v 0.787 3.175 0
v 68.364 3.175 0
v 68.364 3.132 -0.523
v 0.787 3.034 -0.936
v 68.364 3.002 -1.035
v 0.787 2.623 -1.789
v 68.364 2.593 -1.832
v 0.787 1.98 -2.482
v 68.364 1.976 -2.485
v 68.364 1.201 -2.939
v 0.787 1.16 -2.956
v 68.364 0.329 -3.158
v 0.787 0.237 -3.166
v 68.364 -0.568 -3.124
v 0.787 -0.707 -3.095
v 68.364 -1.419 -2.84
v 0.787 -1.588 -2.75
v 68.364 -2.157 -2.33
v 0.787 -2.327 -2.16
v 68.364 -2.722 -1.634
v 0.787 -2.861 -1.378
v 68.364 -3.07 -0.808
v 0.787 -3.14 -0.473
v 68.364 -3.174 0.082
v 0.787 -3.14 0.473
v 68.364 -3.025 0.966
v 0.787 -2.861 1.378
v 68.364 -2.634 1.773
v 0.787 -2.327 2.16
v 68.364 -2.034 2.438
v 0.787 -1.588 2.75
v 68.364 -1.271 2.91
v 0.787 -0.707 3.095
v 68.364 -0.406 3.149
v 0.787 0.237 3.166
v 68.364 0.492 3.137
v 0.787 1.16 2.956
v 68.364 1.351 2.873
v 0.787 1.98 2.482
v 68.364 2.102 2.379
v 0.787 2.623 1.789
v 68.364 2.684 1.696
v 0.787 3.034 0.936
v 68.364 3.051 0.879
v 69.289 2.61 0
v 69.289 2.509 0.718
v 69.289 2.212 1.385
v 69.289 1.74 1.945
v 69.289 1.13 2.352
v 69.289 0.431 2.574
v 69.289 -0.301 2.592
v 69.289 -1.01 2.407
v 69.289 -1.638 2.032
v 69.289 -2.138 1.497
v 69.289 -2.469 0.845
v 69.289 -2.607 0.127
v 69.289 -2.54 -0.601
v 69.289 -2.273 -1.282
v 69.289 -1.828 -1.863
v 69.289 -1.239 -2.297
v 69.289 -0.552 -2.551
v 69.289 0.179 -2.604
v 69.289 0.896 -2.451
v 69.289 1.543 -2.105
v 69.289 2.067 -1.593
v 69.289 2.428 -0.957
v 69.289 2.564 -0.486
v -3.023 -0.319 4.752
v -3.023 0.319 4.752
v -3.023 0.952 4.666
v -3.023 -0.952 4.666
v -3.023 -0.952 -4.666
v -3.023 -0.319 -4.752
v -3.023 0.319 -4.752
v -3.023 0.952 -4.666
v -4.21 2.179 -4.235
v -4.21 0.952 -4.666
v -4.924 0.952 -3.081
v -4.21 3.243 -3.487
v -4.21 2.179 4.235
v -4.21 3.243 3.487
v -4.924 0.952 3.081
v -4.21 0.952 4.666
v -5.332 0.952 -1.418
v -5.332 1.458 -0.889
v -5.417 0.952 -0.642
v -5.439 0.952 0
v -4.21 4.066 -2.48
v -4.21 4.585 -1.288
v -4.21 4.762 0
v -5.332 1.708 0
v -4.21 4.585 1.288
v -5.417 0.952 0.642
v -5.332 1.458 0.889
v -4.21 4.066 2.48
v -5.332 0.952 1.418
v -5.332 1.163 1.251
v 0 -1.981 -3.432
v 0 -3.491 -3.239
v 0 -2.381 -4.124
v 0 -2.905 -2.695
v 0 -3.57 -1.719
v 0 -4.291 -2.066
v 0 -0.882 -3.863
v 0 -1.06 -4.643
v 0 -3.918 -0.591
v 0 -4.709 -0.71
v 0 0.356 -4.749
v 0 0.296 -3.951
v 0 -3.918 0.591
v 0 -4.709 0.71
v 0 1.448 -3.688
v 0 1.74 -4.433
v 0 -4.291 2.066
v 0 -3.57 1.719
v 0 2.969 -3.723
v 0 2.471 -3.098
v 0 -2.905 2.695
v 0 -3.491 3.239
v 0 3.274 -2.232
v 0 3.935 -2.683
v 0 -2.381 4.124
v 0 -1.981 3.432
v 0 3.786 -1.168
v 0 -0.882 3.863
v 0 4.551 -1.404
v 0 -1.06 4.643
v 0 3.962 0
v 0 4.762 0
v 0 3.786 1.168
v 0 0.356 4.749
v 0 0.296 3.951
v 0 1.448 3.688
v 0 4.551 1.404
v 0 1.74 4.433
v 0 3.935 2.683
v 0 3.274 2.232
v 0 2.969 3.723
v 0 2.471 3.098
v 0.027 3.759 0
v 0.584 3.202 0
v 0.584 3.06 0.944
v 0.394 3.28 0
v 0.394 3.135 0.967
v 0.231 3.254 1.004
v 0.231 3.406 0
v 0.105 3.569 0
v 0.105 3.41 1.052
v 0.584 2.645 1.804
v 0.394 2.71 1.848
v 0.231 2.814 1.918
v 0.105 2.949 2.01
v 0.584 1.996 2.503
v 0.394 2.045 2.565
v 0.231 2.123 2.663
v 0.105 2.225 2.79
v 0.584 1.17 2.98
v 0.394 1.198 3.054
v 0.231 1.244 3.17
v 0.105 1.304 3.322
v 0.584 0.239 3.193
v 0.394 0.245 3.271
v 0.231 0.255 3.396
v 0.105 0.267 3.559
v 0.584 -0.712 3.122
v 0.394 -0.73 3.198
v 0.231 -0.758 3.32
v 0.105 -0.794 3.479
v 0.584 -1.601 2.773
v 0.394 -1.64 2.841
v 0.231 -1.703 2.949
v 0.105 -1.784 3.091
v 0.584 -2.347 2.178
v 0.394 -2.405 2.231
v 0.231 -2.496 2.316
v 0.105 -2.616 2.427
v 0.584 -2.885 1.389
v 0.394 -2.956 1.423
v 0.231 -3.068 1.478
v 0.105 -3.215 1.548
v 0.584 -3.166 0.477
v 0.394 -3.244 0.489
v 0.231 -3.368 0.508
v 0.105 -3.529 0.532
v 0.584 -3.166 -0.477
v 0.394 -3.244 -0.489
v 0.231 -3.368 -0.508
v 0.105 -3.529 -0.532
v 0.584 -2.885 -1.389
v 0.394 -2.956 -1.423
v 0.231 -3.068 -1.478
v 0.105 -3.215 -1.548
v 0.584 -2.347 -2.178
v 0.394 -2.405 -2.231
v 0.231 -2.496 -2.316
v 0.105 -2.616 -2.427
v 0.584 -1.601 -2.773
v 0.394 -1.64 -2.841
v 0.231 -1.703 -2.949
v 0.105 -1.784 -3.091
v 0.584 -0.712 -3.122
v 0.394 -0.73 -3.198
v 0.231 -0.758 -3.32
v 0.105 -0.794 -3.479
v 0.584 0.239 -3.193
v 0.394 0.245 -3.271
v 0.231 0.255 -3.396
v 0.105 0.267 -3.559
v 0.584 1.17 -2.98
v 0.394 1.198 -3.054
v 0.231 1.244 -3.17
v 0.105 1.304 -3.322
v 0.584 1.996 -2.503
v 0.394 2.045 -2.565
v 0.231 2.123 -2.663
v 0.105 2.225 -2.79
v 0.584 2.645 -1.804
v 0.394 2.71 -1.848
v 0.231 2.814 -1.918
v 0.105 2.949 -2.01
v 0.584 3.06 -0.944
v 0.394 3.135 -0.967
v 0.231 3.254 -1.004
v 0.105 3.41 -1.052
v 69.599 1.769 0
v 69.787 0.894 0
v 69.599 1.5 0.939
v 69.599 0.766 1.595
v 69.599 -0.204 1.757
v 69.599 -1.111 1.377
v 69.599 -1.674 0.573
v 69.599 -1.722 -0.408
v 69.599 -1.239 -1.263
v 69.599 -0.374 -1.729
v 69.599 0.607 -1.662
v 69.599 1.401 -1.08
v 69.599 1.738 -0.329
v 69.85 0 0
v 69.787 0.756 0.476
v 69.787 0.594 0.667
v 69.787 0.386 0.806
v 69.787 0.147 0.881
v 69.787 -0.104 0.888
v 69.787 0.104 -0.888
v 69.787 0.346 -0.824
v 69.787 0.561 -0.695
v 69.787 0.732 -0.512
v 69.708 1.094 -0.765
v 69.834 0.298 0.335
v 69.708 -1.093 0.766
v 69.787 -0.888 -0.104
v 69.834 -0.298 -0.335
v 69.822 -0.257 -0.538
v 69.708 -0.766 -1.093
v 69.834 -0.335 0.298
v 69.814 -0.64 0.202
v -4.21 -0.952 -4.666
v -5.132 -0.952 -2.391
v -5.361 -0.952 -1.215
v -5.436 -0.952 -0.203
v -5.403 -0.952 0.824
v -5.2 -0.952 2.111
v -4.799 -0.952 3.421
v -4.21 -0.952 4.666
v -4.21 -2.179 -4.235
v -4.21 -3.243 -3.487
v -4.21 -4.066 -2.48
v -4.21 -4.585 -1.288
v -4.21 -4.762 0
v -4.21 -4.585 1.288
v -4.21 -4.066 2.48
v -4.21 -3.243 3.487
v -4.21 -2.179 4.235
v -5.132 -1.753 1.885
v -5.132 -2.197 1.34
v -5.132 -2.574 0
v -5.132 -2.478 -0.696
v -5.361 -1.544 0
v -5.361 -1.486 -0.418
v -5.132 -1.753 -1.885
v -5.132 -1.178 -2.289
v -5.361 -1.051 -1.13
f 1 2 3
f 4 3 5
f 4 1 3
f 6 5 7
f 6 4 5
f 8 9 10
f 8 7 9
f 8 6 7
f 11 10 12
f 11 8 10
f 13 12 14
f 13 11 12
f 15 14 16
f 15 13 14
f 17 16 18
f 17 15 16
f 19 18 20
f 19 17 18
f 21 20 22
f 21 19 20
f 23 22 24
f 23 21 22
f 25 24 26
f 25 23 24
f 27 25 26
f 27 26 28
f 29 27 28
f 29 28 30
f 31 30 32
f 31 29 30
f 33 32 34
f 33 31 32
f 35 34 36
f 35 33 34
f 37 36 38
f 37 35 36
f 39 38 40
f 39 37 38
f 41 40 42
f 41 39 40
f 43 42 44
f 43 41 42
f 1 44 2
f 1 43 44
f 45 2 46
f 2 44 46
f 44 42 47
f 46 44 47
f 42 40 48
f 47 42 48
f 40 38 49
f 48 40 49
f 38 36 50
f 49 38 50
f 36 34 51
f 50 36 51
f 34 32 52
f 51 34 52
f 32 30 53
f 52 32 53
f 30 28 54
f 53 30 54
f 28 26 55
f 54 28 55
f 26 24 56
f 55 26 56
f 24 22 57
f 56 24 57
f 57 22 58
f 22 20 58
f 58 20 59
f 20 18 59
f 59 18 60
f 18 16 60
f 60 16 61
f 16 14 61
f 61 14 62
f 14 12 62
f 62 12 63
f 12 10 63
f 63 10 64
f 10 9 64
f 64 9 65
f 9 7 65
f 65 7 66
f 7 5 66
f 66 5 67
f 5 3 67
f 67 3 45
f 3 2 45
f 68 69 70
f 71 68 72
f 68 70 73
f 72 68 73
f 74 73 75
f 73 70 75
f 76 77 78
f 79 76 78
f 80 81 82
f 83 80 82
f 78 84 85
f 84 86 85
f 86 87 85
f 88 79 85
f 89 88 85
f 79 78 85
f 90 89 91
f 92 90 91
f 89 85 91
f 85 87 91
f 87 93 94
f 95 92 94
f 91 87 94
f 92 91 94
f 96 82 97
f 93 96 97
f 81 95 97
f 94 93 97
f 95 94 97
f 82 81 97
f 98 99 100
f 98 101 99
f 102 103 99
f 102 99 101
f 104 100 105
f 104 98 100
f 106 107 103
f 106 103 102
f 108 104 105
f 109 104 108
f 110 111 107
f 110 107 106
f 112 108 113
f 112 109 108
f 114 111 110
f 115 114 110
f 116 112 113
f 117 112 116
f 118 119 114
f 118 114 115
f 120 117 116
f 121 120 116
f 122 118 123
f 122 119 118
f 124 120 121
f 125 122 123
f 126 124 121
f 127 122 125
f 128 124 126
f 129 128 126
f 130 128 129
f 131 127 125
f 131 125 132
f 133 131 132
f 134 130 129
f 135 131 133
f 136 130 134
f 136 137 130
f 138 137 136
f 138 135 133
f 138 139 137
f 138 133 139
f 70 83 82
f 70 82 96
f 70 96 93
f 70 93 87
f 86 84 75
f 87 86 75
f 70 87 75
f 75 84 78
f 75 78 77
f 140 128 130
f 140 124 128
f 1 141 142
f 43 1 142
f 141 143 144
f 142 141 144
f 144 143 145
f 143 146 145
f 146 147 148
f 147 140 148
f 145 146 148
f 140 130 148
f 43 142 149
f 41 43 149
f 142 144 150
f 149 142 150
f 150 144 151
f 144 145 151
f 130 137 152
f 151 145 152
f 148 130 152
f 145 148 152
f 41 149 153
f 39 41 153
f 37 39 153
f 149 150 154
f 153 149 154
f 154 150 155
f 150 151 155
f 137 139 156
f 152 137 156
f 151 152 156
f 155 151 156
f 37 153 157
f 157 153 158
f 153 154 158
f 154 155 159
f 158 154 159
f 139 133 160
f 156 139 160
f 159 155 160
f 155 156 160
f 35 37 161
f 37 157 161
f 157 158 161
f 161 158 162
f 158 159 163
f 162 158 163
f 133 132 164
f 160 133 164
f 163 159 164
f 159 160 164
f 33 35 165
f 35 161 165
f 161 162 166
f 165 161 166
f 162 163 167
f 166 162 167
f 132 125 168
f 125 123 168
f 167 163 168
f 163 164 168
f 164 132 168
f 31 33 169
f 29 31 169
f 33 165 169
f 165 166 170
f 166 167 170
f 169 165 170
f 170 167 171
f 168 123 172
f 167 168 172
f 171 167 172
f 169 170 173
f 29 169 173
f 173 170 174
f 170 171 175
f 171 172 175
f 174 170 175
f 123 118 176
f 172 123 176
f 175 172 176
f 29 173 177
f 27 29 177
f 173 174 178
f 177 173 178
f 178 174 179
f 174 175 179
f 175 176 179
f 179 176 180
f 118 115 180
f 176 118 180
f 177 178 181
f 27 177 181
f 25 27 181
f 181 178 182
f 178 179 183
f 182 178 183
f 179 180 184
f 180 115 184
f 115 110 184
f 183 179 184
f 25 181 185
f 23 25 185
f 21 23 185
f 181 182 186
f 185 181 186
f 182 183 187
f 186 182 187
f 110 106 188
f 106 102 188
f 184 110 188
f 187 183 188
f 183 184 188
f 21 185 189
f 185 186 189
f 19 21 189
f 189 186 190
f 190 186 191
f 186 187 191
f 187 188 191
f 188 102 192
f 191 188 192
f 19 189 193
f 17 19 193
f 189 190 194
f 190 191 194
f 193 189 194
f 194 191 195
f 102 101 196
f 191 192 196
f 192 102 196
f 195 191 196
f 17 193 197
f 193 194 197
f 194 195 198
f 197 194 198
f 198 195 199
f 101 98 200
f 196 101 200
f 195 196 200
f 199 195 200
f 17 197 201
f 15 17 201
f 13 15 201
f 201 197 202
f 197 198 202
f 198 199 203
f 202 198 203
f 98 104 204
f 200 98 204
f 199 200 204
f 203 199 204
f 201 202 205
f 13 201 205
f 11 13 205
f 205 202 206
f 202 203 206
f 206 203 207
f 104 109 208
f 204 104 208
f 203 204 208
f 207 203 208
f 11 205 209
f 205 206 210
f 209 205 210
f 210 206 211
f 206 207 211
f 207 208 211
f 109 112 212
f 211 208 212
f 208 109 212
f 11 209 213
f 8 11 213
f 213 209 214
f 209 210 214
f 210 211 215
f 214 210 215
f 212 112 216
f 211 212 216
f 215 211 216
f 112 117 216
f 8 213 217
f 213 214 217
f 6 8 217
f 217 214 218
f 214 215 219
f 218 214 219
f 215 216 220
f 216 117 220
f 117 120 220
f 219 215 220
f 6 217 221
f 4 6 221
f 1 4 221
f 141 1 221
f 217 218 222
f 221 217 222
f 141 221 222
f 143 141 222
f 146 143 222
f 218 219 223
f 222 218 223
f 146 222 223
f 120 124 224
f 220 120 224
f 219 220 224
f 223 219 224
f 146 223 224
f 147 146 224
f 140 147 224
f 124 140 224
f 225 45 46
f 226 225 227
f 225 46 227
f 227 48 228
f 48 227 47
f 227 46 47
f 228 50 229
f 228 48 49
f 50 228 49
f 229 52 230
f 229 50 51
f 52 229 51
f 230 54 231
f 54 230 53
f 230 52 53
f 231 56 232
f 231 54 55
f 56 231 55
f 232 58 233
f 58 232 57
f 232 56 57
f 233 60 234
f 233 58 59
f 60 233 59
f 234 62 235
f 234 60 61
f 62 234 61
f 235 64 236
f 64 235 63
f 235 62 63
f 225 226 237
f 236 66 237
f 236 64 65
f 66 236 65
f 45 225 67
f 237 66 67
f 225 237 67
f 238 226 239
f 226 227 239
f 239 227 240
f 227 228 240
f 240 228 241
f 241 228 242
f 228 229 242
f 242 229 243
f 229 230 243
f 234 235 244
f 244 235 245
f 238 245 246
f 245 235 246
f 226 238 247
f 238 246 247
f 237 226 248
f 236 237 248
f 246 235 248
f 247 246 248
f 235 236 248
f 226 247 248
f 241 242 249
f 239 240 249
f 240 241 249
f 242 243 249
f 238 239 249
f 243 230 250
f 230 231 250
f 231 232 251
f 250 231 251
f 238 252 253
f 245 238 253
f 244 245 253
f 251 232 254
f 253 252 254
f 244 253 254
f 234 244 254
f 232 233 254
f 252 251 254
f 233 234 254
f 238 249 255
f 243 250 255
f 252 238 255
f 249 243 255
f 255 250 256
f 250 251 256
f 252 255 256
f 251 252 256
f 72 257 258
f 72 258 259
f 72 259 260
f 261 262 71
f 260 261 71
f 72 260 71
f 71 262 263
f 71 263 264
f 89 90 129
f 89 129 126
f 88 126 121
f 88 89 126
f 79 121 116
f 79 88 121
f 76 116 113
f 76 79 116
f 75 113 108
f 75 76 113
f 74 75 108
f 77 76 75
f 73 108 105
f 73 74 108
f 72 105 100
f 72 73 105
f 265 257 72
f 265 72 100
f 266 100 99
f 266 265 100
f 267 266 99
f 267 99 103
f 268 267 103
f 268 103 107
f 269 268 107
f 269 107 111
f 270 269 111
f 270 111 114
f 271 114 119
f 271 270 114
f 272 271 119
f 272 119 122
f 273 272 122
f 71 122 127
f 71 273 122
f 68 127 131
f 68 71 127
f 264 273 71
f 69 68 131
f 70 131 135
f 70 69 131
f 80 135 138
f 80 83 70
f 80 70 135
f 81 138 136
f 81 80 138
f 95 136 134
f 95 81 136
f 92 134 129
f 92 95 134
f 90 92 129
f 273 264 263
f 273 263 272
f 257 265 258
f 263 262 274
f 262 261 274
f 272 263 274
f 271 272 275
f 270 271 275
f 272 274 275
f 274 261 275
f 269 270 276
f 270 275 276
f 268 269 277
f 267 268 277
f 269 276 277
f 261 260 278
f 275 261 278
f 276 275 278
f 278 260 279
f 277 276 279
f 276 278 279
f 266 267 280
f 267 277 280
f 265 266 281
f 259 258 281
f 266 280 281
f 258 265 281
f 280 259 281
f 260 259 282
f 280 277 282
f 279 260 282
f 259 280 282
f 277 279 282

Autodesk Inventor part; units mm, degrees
ref_plane "YZ Plane" through (0, 0, 0) normal (1, 0, 0) x (0, 1, 0)
sketch "Sketch1" plane through (0, 0, 0) normal (0, 0, 1) x (1, 0, 0)
  line L0 (-5.4864, 0) -> (69.85, 0)
  line L1 (69.85, 0) -> (69.85, 3.175)
  line L2 (69.85, 3.175) -> (50.8, 3.175)
  line L3 (50.8, 3.175) -> (50.038, 3.175)
  line L4 (50.038, 3.175) -> (0, 3.175)
  line L5 (0, 3.175) -> (0, 4.7625)
  line L6 (-20.9299, 0) -> (84.98, 0) projected
  line L7 (0, -0.9693) -> (0, 5.8158) projected
  line L8 (0, 4.7625) -> (-4.2103, 4.7625)
  arc A0 (-4.2103, 4.7625) -> (-5.4864, 0) centre (4.0386, 0) ccw
  line L9 (50.8, 3.175) -> (0, 3.175) construction
  dimension "d0" = 69.85
  dimension "d1" = 19.05
  dimension "d2" = 0.762
  dimension "d3" = 5.4864
  dimension "d4" = 6.35
  dimension "d5" = 6.35
  dimension "d9" = 9.525
  dimension "d10" = 0
  dimension "d13" = 9.525
revolve "Body" add sketch "Sketch1" angle 360 about axis through (-5.4864, 0, 0) along (1, 0, 0)
ref_plane "IDS_WORKPLANE{1}" through (-5.4864, 0, 0) normal (1, 0, 0) x (0, 0, -1)
sketch "Sketch2" plane through (-5.4864, 0, 0) normal (1, 0, 0) x (0, 0, -1)
  circle A0 centre (0, 0) radius 4.7625 projected
  line L0 (0, -6.6675) -> (0, 6.6675) projected
  line L1 (6.6675, 0) -> (-6.6675, 0) projected
  line L2 (-4.7625, 0.9525) -> (4.7625, 0.9525)
  line L3 (4.7625, 0.9525) -> (4.7625, -0.9525)
  line L4 (4.7625, -0.9525) -> (-4.7625, -0.9525)
  line L5 (-4.7625, -0.9525) -> (-4.7625, 0.9525)
  line L6 (-4.7625, 0) -> (4.7625, 0) construction
  line L7 (0, 0.9525) -> (0, -0.9525) construction
  dimension "d15" = 1.905
extrude "Slot" cut sketch "Sketch2" along normal blind 2.4638 contours L1 L0 L2 A0 | L3 L4 A0 | A0 L4 L0 L1 | A0 L2 L3 | L1 A0 L2 L0 | L0 L4 A0 L1 | L5 L2 A0 | A0 L4 L5
thread "Thread" size "1/4-20 UNC" class "2A" standard "ANSI Unified Screw Threads" length 19.05
sketch "Sketch3" plane through (0, 0, 0) normal (0, 0, 1) x (1, 0, 0)
  line L0 (69.85, 0) -> (69.85, 3.175) projected
  line L1 (69.85, 3.175) -> (50.8, 3.175) projected
  line L2 (-5.4864, 0) -> (69.85, 0) projected
  arc A0 (69.85, 0) -> (68.9993, 3.175) centre (63.5, 0) ccw
  line L3 (69.85, -3.175) -> (69.85, 3.175) projected
  line L4 (68.9993, 3.175) -> (68.9993, 0)
  line L5 (68.9993, 0) -> (69.85, 0)
  dimension "d40" = 6.35
revolve "Fillet1" cut sketch "Sketch3" angle 360 about axis through (-5.4864, 0, 0) along (1, 0, 0) contours A0 L1 L0
chamfer "Chamfer" distance 0.635 angle 45 1 edges at (68.9993, -3.175, 0)
ref_plane "Work Plane2" through (41.275, 0, 0) normal (0, 0, -1) x (1, 0, 0)
fillet "Fillet4" radius 0.7874 1 edges at (0, -3.175, 0)
equation "\"d0\" = NLG"
equation "\"d1\" = GEL"
equation "\"d2\" = GAL"
equation "\"d3\" = KOH"
equation "\"d4\" = GD"
equation "\"d5\" = BDM"
equation "\"d9\" = KOD"
equation "\"d13\" = KR"
equation "\"d15\" = SBR"
equation "\"d16\" = STI"
equation "\"d40\" = GD"
equation "\"d46\" = R"
equation "\"d11\" = GEL"
equation "\"d43\" = 0.5 * RR"
equation "\"GD\" = NND"
equation "\"NLG\" = 69.85"
equation "\"GEL\" = 19.05"
equation "\"KOD\" = 9.525"
equation "\"KOH\" = 5.4864"
equation "\"GAL\" = 0.762"
equation "\"BDM\" = NND"
equation "\"SBR\" = 1.905"
equation "\"STI\" = 2.4638"
equation "\"KEWI\" = 0"
equation "\"KR\" = KOD"
equation "\"d14\" = -KOH"
equation "\"R\" = 0.7874"
equation "\"THREADDIA\" = 6.35"
equation "\"TOA\" = 30deg"
equation "\"KOH1\" = 4.3688"
equation "\"NND\" = 6.35"
equation "\"GD1\" = 4.8387"
equation "\"THREADDESC\" = 1.2345"
equation "\"RR\" = 1.27"
properties part number "ANSI B18.6.2 - 1/4-20 UNC - 2.75, SFHCSI" material "Steel, Mild"
